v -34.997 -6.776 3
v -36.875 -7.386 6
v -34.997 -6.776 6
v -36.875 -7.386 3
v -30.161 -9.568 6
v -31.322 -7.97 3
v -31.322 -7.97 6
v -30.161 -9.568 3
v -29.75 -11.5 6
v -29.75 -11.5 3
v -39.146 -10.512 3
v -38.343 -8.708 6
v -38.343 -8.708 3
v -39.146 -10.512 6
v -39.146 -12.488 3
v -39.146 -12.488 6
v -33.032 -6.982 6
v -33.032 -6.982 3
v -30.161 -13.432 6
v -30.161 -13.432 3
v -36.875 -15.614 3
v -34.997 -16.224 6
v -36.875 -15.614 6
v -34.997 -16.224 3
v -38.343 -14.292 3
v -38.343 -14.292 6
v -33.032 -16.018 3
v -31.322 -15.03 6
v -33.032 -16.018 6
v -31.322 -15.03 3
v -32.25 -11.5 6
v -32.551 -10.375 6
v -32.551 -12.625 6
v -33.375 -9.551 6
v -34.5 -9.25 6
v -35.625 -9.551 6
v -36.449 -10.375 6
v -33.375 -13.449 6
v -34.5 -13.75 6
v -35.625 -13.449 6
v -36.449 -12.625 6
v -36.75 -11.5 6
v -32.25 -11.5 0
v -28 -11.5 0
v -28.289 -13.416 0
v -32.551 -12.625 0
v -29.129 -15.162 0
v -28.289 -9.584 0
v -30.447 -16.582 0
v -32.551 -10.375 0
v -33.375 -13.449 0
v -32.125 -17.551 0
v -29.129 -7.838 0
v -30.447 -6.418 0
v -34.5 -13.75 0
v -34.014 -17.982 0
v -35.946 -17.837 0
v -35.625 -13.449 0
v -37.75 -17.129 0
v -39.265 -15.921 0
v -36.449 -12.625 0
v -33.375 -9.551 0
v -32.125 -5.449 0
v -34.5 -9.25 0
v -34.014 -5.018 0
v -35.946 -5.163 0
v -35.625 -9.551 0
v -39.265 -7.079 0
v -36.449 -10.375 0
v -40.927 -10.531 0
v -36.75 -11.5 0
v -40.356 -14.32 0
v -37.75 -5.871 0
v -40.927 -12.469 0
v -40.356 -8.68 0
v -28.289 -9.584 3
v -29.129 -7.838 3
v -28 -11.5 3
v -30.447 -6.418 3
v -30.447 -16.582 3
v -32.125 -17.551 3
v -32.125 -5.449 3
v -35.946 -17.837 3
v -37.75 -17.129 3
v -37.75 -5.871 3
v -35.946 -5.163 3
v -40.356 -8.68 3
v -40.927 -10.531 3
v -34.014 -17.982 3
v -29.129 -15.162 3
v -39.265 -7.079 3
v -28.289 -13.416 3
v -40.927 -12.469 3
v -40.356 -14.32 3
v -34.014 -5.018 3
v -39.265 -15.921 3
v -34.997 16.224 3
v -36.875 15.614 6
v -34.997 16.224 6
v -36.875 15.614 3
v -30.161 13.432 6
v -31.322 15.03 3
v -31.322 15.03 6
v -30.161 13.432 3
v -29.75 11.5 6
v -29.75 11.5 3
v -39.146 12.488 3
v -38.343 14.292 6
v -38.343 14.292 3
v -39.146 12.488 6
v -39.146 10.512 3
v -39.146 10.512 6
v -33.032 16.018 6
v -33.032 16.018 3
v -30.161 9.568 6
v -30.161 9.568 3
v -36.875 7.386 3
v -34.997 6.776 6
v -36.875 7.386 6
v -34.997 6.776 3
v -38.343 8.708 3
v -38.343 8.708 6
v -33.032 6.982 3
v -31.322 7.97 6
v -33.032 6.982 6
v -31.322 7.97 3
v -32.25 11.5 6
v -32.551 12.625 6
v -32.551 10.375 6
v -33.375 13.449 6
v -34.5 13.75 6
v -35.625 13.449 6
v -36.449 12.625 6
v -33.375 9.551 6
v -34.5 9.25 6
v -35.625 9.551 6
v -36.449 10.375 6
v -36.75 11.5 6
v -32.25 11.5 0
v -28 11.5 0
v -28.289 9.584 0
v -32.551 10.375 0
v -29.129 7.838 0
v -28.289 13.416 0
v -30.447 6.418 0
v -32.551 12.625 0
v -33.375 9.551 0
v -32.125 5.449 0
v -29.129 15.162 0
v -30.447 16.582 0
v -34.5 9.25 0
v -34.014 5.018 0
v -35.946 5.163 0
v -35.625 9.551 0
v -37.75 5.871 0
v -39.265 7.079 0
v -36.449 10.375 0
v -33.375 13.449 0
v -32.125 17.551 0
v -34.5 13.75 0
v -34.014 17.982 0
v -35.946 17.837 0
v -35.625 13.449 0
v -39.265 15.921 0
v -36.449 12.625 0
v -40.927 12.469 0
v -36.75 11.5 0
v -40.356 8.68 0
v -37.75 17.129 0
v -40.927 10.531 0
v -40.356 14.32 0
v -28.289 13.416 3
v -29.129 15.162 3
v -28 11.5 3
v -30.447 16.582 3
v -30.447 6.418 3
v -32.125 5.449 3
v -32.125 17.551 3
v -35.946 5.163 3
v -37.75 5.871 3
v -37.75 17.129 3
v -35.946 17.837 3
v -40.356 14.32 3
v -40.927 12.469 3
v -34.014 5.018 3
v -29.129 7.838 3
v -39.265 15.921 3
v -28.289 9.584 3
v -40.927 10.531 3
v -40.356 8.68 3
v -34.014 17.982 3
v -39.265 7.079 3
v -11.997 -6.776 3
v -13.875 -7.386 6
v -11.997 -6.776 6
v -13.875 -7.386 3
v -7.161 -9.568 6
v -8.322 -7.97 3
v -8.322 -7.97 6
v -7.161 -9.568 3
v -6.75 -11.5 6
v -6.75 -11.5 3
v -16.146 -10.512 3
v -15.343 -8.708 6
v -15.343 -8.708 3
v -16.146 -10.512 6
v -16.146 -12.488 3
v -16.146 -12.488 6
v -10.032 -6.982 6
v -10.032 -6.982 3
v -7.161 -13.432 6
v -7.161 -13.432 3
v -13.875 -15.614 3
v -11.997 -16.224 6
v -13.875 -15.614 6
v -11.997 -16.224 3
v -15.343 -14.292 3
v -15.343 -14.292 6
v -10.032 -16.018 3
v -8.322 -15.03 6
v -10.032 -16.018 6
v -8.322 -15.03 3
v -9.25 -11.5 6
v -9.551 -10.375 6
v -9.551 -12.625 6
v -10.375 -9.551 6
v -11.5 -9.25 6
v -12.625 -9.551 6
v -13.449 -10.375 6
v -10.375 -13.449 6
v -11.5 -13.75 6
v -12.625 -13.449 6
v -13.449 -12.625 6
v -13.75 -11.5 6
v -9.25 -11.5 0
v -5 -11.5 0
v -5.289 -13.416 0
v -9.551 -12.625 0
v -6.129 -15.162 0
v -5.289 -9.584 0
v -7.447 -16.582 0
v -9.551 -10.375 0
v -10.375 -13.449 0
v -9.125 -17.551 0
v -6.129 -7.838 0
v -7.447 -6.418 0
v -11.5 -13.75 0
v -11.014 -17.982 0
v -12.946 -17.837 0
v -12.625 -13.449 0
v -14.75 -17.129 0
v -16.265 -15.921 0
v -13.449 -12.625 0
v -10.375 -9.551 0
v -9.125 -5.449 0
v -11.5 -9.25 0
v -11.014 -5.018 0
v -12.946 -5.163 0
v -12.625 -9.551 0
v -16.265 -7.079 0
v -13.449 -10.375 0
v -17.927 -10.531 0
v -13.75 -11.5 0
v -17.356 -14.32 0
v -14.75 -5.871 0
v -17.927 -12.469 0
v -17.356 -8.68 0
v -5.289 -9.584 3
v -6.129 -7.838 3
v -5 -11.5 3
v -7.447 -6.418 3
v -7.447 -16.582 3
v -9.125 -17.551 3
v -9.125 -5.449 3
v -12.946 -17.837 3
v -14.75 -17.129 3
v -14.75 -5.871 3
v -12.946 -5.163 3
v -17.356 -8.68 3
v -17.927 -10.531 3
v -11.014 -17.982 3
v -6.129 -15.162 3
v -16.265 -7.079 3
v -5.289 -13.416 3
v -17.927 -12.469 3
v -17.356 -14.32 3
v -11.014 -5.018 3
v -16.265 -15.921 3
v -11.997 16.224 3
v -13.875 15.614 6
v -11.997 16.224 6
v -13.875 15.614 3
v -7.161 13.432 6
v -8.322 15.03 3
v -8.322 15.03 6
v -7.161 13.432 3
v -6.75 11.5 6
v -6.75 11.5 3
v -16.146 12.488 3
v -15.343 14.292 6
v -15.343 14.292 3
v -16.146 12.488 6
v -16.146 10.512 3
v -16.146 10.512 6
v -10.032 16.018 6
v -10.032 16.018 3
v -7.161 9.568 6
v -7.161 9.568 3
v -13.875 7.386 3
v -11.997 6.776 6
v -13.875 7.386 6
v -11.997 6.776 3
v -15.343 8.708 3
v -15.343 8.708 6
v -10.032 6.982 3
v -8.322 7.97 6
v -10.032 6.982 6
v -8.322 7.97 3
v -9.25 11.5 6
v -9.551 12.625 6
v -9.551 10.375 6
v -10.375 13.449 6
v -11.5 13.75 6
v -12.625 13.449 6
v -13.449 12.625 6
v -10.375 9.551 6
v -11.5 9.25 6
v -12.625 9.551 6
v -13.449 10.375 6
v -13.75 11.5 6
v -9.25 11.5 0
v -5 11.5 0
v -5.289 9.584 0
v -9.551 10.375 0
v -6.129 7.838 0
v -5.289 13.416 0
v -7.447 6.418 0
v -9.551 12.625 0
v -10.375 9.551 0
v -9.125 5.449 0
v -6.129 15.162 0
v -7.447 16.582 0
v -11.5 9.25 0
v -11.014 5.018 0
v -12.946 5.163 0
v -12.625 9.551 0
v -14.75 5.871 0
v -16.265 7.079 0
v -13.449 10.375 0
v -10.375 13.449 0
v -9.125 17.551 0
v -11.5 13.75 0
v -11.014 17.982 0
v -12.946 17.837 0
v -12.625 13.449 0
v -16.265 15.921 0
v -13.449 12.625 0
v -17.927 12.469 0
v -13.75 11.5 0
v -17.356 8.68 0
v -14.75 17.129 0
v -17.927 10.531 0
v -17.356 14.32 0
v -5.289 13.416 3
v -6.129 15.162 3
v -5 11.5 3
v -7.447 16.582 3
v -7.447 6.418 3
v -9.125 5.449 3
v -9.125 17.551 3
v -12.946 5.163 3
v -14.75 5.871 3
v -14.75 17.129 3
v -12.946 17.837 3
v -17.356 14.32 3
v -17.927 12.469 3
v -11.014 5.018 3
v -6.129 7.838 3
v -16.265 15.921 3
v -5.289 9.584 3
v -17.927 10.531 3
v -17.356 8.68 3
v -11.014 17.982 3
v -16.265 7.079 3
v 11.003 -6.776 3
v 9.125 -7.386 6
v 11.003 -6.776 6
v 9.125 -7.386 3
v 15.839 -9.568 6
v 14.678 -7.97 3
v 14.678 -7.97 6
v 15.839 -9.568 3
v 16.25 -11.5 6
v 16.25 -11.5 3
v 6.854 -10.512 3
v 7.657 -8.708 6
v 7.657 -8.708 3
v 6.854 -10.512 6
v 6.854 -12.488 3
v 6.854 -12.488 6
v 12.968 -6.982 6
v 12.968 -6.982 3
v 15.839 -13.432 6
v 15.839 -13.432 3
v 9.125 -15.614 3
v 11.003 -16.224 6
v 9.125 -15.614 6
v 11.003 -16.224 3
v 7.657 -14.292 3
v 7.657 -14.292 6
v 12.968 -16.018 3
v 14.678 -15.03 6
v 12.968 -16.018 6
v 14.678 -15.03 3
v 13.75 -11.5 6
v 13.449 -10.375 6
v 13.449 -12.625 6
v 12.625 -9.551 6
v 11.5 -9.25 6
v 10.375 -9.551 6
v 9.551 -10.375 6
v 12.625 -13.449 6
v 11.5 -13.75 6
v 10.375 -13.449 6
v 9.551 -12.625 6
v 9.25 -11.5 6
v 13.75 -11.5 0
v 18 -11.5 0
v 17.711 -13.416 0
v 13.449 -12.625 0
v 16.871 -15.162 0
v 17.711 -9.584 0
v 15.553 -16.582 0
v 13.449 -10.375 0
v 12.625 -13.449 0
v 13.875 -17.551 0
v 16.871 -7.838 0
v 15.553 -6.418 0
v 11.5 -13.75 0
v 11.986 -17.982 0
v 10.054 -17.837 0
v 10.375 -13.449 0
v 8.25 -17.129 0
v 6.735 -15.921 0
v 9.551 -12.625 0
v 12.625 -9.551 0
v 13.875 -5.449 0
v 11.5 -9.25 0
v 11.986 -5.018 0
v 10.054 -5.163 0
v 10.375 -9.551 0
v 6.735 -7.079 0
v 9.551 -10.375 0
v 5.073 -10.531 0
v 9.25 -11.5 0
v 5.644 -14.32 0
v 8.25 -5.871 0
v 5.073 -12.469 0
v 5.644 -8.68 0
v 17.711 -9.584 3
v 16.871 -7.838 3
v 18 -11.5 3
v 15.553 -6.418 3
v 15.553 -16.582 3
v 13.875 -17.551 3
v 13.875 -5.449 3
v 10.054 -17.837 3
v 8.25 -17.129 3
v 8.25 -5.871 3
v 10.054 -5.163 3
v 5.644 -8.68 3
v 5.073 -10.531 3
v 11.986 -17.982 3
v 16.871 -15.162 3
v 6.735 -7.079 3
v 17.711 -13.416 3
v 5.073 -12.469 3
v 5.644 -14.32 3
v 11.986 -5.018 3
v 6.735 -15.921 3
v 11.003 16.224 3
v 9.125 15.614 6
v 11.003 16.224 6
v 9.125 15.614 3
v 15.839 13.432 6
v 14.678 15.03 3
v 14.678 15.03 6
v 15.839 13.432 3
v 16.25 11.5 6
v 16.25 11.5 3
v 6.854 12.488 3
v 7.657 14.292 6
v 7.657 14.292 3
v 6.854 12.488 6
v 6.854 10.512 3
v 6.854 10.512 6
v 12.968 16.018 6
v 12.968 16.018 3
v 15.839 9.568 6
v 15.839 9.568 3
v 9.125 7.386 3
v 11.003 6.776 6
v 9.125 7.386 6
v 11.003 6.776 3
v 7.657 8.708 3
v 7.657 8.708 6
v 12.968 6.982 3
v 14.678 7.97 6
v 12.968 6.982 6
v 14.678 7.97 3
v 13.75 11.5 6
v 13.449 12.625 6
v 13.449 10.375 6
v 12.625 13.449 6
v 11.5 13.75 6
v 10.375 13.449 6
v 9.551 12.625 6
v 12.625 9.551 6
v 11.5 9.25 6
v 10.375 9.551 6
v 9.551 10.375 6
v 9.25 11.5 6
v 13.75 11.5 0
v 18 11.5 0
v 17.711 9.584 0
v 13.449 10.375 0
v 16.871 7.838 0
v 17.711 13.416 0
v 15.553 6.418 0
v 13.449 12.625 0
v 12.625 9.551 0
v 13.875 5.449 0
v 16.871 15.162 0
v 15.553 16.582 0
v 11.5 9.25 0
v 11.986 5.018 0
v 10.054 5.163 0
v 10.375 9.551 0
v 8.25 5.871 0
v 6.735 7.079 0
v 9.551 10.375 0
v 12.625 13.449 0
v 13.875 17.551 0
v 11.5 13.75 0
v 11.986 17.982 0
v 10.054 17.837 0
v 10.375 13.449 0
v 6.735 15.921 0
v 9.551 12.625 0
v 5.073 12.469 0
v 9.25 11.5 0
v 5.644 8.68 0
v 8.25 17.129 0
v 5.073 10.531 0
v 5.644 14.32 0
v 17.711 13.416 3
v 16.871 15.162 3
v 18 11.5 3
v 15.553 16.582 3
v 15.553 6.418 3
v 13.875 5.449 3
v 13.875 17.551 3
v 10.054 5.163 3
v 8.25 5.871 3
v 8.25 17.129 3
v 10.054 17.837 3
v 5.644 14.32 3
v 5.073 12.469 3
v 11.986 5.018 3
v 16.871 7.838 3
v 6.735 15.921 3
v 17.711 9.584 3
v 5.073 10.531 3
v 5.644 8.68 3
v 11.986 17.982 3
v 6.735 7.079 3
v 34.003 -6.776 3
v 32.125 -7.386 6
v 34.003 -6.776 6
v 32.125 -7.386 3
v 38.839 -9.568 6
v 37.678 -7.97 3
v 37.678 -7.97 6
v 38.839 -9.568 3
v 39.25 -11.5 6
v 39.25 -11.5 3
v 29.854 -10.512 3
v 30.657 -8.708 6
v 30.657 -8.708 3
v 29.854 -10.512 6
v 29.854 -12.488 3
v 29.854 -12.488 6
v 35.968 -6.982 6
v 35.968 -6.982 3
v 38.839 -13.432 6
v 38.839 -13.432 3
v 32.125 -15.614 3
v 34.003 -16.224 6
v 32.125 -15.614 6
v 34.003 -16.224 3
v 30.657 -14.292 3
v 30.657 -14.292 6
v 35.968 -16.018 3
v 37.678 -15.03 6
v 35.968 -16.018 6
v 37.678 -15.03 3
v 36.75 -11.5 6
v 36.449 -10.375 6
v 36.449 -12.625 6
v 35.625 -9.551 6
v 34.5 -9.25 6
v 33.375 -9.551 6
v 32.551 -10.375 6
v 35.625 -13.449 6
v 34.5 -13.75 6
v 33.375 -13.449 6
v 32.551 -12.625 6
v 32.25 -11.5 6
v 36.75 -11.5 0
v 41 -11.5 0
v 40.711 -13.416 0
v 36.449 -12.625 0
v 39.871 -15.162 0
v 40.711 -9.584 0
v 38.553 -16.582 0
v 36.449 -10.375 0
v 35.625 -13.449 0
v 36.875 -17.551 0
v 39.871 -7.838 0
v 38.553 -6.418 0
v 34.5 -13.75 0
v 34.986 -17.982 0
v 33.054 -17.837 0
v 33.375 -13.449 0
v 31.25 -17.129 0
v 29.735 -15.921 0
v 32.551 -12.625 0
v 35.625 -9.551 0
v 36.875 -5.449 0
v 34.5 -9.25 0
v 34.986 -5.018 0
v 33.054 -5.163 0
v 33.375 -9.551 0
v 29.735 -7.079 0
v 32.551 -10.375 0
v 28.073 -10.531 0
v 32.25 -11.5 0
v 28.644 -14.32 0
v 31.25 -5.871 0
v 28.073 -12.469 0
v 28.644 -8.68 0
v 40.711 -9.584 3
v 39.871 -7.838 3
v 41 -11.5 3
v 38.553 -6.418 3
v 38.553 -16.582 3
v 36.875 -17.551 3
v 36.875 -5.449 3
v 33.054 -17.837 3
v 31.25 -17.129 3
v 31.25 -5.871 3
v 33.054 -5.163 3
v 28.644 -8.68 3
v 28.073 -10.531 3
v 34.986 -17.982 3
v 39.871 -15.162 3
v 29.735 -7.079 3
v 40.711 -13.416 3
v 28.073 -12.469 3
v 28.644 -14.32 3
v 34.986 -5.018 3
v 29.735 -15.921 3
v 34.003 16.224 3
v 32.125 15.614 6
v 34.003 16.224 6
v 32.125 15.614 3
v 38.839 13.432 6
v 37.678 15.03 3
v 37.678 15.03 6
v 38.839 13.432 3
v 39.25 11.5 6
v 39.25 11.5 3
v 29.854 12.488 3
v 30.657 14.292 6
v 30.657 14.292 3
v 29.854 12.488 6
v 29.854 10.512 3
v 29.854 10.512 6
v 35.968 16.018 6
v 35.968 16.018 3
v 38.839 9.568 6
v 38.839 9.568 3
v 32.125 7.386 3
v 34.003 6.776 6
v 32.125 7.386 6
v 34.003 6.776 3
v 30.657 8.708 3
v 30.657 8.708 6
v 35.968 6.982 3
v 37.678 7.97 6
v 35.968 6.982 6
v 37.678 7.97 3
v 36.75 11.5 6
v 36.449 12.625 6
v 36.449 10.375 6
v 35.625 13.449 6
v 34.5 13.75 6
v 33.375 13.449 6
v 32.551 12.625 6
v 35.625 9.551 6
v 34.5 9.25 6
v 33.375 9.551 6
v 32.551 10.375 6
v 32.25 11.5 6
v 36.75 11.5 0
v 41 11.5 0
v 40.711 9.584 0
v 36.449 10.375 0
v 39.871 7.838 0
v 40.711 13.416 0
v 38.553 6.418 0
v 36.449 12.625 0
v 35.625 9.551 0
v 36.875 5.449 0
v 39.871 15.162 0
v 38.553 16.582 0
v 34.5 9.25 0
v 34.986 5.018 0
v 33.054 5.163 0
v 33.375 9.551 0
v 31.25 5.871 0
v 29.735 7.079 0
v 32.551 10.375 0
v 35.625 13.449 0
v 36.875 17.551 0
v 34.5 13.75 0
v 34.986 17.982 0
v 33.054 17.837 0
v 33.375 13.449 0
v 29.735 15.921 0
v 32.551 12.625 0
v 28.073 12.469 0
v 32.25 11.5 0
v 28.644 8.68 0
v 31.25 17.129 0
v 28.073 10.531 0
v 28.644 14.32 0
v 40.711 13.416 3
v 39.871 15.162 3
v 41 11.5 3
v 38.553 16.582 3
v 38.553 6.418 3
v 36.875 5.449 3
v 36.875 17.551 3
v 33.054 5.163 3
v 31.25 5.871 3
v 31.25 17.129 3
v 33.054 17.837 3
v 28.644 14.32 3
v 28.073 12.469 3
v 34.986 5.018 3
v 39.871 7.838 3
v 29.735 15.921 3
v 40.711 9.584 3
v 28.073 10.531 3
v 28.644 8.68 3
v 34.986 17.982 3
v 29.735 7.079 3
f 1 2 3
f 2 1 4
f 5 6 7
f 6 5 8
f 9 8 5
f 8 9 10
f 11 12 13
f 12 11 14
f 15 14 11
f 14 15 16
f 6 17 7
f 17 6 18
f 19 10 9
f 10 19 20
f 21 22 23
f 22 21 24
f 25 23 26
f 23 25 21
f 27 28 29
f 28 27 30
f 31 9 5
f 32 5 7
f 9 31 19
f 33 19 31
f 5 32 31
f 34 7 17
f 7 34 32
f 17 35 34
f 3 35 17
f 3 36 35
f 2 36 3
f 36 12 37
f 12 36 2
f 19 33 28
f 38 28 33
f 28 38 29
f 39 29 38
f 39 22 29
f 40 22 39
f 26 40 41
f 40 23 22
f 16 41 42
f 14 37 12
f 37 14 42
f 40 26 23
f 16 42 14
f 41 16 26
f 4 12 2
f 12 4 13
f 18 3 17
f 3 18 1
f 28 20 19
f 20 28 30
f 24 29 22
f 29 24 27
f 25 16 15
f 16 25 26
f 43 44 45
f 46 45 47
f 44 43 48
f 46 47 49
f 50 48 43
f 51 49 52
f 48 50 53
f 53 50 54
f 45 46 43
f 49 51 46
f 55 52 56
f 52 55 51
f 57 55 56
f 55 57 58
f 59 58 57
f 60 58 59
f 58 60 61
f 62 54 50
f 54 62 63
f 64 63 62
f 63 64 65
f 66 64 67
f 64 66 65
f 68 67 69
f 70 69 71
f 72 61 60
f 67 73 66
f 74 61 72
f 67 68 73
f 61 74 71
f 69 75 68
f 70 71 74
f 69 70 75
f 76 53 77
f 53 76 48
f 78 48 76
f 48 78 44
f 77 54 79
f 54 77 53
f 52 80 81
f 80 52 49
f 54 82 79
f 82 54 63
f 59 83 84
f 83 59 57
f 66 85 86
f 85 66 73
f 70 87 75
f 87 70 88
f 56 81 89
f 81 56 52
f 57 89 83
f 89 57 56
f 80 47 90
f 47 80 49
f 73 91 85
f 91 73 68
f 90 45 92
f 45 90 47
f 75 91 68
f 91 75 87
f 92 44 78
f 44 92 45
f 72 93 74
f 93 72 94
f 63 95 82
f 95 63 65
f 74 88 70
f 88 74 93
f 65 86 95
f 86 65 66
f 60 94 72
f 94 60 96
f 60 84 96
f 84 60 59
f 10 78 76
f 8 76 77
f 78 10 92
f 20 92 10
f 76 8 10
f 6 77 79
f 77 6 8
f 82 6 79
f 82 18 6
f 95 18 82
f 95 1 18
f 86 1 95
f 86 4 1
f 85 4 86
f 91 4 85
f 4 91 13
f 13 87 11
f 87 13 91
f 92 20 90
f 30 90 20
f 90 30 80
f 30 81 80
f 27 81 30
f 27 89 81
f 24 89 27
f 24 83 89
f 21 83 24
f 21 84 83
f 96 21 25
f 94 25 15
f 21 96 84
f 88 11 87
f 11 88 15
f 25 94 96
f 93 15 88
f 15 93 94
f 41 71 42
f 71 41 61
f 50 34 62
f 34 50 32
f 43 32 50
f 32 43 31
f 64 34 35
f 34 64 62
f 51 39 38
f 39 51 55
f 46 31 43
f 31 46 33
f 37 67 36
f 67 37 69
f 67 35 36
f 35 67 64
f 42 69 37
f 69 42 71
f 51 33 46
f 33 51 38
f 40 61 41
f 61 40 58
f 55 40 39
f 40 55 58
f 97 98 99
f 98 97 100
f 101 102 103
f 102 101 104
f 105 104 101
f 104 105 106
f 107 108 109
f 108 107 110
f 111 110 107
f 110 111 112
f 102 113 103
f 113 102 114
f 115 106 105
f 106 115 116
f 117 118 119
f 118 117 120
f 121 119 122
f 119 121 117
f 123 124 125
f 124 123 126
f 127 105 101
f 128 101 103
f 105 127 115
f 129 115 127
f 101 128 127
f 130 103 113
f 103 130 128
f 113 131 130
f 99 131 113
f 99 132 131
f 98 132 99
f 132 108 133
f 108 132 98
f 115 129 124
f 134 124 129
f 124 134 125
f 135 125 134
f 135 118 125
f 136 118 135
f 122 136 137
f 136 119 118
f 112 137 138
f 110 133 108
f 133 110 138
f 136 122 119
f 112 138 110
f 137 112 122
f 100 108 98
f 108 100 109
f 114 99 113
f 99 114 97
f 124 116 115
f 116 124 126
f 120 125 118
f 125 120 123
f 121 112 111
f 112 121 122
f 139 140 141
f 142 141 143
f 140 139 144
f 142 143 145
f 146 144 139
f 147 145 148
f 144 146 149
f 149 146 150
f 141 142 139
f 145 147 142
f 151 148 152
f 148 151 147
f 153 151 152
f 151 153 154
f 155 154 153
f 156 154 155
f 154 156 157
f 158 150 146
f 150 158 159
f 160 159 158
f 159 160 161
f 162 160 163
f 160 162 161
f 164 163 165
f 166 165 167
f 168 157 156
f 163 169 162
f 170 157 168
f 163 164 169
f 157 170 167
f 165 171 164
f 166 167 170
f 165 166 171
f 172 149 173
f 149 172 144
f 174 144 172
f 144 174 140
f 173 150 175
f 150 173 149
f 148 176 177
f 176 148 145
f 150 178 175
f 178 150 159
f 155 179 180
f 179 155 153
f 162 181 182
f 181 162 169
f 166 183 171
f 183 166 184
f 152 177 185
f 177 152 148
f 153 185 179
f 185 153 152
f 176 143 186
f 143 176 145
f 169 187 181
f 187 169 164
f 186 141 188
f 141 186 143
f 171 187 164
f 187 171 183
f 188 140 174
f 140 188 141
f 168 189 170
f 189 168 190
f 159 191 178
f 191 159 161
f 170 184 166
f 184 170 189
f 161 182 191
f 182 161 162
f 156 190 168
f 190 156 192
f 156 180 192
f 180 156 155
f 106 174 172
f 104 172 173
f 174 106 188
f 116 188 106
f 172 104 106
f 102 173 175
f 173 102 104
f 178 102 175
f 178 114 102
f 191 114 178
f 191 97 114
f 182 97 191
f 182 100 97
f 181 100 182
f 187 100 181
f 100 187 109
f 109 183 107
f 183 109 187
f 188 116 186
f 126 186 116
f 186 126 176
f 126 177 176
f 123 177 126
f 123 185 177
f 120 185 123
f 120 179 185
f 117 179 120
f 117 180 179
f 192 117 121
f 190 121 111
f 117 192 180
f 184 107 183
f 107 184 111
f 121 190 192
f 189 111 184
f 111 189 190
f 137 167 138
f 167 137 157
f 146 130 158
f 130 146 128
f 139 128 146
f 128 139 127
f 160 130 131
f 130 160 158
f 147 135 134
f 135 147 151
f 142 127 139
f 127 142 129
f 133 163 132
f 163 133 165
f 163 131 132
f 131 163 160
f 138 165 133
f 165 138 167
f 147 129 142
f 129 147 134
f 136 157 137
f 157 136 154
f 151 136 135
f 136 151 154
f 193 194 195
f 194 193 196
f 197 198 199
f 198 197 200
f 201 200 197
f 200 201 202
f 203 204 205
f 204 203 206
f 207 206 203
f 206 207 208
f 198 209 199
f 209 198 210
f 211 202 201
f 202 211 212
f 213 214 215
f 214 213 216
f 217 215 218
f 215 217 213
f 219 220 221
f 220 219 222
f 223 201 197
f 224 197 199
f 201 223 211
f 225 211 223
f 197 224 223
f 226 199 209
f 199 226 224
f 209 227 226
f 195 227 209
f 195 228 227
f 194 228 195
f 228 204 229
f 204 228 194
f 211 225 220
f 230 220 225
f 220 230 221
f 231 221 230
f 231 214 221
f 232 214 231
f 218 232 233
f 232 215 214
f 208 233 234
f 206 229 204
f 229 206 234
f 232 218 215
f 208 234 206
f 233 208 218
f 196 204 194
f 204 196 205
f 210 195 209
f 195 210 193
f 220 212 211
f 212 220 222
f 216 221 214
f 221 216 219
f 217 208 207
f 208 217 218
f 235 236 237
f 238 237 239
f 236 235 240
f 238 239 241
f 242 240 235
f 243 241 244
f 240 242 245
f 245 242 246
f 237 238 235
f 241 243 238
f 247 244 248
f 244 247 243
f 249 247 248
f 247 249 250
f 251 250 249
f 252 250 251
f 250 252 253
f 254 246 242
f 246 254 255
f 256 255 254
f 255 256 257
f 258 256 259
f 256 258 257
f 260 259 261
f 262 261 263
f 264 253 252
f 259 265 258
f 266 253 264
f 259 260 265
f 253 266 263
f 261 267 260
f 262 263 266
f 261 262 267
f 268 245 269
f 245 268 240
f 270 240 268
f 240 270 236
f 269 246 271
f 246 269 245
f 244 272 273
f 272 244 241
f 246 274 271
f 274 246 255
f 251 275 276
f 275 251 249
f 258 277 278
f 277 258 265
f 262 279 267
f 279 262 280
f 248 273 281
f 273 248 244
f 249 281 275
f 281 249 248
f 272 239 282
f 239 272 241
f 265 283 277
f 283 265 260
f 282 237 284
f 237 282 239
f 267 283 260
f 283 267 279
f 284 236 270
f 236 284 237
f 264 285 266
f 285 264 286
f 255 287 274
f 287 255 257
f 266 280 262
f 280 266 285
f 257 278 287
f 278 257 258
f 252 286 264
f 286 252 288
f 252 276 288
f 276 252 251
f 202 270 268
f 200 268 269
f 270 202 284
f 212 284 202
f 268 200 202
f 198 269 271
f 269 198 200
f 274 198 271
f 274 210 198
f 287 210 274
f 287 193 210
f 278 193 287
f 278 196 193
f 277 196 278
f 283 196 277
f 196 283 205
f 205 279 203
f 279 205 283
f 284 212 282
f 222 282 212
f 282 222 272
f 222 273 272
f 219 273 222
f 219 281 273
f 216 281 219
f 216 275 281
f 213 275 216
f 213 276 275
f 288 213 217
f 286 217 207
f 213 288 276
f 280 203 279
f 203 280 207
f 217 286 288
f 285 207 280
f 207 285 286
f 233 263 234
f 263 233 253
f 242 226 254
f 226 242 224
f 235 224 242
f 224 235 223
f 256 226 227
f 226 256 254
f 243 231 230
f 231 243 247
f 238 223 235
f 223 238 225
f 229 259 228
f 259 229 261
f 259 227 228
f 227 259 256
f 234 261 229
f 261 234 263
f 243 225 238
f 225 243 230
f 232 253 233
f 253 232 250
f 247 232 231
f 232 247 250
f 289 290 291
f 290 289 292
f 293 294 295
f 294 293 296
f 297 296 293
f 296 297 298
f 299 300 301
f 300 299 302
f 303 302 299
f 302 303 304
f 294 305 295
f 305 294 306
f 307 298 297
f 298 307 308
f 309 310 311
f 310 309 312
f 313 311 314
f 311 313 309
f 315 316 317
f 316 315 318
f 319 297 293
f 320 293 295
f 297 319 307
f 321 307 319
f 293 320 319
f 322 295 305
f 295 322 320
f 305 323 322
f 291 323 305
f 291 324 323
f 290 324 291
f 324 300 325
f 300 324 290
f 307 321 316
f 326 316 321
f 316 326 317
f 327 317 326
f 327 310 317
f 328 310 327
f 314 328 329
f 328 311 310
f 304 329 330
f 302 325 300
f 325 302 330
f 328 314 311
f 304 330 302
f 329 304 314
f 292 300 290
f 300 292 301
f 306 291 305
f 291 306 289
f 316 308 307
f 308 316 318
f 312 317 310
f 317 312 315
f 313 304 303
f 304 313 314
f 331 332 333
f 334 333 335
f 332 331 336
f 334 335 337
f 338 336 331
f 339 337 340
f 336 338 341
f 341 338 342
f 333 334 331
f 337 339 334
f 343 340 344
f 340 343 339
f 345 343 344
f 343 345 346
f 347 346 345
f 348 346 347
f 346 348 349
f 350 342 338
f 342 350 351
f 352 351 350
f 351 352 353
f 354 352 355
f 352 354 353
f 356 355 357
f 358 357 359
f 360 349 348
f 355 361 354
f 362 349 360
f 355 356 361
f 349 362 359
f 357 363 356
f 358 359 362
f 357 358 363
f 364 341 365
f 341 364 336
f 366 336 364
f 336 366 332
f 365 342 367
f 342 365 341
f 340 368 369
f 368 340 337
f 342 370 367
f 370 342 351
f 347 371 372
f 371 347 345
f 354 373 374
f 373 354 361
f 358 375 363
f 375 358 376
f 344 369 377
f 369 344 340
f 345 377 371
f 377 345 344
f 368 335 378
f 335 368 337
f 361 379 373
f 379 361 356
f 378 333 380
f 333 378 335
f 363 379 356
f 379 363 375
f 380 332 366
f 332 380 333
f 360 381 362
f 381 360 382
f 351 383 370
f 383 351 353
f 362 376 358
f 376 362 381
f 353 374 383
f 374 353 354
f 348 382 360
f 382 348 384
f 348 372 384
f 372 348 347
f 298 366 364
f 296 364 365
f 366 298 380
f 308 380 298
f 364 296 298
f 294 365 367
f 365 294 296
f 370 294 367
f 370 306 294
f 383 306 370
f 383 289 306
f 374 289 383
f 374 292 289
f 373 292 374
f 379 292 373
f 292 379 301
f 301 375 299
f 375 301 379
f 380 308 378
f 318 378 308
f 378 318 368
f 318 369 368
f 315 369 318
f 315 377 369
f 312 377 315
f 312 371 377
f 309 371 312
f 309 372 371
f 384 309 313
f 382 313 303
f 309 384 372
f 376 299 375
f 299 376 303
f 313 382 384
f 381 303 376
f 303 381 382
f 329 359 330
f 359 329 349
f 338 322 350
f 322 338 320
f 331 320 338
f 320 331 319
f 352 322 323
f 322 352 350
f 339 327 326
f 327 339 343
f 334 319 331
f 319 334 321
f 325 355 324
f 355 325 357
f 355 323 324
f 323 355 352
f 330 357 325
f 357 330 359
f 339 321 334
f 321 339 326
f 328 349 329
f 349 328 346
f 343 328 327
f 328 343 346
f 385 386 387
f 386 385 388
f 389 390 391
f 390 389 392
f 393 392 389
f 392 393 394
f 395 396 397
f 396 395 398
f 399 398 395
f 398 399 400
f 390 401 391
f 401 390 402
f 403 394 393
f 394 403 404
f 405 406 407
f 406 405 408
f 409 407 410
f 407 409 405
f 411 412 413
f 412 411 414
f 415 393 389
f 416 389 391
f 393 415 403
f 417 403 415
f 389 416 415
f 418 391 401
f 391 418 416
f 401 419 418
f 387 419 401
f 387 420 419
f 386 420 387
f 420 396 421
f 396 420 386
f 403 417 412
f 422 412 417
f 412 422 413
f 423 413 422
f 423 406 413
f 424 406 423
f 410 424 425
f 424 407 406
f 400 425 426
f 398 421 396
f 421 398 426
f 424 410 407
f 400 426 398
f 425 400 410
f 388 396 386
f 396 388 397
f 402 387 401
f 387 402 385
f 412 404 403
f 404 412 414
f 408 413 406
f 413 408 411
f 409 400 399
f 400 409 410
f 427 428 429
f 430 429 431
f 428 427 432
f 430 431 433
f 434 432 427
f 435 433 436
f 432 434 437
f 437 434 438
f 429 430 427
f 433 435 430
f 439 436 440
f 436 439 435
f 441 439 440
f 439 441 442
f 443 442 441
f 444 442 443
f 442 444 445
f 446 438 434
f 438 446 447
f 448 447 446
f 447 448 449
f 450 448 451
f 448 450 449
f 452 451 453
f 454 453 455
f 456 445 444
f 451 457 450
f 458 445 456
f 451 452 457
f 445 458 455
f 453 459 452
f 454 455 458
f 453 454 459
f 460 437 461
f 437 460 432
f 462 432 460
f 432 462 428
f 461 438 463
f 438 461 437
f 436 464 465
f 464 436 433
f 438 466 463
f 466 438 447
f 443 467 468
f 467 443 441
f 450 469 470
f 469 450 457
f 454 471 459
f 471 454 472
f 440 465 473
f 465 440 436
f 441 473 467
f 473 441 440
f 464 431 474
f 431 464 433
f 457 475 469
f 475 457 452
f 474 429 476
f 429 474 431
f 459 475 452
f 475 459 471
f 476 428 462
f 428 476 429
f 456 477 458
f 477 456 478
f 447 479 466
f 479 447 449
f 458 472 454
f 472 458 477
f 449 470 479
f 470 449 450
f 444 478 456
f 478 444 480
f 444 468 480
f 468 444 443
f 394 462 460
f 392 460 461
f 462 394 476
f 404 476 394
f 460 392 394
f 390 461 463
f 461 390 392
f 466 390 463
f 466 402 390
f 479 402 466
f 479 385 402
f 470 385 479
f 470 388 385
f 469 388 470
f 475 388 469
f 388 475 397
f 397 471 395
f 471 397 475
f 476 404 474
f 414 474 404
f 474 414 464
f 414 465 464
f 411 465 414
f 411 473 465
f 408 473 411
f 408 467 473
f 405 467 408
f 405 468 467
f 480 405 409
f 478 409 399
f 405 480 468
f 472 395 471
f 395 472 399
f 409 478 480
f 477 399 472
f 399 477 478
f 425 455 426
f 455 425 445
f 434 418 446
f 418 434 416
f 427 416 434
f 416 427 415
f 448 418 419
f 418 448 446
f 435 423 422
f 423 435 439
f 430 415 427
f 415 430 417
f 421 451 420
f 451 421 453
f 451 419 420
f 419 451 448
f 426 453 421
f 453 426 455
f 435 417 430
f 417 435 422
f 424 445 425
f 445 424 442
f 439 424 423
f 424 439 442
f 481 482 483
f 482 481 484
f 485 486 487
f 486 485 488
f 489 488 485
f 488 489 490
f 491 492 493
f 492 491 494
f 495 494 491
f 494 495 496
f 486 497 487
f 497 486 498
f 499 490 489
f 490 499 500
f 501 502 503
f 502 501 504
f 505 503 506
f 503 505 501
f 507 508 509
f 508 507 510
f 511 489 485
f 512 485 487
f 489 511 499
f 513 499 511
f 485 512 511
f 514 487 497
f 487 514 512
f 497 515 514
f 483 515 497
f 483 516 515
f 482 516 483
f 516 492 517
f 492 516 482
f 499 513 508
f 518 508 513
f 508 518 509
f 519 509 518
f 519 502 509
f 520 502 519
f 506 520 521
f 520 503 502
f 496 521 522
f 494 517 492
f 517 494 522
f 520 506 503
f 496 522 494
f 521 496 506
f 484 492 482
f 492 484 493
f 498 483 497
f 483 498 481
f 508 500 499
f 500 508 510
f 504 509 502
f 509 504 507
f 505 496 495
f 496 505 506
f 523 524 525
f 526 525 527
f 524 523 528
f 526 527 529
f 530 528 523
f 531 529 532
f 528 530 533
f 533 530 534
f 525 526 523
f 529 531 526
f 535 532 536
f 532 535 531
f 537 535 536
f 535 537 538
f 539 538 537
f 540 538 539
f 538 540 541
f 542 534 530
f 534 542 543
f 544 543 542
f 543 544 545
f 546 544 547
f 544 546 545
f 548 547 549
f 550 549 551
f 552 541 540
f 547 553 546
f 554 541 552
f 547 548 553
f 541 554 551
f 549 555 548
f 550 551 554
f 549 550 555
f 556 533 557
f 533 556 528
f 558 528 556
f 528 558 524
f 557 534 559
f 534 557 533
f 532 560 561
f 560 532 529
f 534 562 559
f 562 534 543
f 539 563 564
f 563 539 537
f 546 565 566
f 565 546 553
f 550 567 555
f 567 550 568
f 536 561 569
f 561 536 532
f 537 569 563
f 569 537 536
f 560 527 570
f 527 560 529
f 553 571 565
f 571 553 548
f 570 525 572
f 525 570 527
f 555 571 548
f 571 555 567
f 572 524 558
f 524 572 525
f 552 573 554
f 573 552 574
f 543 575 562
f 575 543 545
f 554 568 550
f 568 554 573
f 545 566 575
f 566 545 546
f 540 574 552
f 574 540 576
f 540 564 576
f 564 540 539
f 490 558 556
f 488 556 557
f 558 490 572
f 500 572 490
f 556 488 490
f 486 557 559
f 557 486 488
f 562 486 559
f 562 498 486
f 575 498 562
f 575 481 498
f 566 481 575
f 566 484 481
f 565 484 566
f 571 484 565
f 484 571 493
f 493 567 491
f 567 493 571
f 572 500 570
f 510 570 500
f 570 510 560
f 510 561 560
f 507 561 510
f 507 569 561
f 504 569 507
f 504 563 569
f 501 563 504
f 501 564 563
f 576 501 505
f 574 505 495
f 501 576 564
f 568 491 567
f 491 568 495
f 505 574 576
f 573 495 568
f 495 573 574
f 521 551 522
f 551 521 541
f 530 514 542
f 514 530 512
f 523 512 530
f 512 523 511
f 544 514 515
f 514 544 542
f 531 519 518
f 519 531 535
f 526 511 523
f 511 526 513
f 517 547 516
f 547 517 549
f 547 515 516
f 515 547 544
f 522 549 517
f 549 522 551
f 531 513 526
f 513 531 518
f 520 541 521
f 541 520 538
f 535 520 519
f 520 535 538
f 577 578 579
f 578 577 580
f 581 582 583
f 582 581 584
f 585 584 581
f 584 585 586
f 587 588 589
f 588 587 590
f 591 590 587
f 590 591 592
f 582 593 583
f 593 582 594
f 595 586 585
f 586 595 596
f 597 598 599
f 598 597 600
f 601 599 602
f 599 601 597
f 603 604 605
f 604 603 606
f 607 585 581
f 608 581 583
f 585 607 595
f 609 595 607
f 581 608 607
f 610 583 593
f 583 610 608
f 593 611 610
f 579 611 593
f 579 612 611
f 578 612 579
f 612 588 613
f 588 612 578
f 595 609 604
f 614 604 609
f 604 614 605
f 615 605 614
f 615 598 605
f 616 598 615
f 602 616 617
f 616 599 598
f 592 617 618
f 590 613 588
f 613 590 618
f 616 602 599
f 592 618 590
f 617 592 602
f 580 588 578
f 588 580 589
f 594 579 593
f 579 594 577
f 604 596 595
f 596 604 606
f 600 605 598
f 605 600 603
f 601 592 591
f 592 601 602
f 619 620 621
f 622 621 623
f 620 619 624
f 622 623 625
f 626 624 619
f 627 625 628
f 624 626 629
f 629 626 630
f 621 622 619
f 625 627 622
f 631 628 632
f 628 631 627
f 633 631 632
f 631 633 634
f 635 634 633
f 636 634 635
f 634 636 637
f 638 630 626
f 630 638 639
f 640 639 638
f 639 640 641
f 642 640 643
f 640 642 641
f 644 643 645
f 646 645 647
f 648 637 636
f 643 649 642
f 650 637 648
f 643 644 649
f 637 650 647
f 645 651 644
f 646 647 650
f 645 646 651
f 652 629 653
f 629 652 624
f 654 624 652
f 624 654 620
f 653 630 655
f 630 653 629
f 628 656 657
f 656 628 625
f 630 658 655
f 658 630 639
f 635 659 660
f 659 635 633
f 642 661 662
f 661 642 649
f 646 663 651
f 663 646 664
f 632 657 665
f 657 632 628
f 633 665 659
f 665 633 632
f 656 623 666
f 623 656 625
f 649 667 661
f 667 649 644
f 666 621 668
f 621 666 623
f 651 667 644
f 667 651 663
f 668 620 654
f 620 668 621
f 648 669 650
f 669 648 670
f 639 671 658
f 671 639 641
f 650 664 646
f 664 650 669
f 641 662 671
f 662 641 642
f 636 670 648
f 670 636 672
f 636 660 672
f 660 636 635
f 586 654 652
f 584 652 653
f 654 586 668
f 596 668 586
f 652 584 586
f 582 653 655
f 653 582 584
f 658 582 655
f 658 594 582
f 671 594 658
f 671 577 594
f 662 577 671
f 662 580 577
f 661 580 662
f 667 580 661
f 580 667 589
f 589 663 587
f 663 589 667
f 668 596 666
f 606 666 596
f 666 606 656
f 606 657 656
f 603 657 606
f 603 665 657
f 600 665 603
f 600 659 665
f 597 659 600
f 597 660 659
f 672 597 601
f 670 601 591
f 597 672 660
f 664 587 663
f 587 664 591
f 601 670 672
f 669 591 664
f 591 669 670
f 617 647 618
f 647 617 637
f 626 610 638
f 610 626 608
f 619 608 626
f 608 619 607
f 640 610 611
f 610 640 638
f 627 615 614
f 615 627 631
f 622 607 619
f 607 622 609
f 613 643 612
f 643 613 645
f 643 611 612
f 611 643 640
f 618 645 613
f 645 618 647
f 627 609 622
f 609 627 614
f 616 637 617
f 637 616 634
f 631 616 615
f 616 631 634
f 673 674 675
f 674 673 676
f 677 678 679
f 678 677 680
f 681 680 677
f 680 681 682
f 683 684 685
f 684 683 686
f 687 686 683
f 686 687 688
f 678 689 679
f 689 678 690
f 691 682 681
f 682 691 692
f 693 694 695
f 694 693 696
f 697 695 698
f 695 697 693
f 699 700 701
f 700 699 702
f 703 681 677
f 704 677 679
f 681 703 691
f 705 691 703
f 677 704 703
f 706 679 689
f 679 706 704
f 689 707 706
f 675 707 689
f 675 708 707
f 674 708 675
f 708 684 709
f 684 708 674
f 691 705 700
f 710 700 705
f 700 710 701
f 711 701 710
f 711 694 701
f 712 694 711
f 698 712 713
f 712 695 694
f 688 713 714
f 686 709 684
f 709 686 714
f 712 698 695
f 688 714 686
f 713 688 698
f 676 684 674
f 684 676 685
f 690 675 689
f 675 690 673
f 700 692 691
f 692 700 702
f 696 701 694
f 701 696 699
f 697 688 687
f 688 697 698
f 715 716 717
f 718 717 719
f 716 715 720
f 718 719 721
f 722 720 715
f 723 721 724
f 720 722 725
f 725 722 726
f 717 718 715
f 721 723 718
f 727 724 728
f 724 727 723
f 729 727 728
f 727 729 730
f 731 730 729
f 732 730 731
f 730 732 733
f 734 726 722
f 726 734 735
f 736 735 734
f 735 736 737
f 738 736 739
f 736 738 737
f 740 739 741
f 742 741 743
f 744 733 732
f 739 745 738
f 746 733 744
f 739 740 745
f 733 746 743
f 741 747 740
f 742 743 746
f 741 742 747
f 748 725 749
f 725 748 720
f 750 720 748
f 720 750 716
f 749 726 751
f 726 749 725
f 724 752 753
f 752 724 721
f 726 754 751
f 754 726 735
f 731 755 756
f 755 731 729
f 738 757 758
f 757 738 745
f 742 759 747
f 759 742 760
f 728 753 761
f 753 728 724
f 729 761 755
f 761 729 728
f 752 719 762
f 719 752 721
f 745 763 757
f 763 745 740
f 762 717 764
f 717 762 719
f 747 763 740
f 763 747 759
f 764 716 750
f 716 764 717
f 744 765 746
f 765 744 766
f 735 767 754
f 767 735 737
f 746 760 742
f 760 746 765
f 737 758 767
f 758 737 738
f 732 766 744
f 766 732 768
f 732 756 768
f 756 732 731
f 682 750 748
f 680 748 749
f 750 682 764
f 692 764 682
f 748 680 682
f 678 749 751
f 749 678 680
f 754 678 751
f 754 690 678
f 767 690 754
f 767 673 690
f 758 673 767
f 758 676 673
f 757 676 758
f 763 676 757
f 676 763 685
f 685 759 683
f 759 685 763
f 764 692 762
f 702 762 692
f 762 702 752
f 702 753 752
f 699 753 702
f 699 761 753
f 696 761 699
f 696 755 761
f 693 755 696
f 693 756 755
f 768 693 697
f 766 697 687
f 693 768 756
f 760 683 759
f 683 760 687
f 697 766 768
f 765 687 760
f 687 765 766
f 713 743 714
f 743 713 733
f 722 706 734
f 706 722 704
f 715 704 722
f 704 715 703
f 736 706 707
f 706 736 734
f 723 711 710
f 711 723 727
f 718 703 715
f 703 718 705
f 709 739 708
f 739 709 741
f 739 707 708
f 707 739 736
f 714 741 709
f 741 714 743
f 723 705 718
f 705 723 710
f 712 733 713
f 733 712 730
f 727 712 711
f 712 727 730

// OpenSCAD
// Single object
module springseat(od, id, boltd, totalh, flangeh)
{
  or = od/2;
  ir = id/2;
  br = boltd/2;
  difference()
  {
    union() { 
      cylinder(r=ir, h=totalh); 
      cylinder(r=or, h=flangeh); 
    }
    translate([0,0,-6]) { 
      cylinder(r=br, h=totalh+10, $fn=12); 
    }
  }
}

// Main object array:
outerd = 13;
innerd = 9.5;
holed  = 4.5;   // +0.5 for M4 bolt
totalh = 6;
endh   = 3;

// Implicit union of all objects
pitch = outerd+10;
for (x = [-1.5*pitch,-0.5*pitch,0.5*pitch,1.5*pitch]) {
  for (y = [-0.5*pitch,0.5*pitch]) {
    translate([x,y,0]) { 
      springseat(outerd, innerd, holed, totalh, endh); 
    }
  }
}
